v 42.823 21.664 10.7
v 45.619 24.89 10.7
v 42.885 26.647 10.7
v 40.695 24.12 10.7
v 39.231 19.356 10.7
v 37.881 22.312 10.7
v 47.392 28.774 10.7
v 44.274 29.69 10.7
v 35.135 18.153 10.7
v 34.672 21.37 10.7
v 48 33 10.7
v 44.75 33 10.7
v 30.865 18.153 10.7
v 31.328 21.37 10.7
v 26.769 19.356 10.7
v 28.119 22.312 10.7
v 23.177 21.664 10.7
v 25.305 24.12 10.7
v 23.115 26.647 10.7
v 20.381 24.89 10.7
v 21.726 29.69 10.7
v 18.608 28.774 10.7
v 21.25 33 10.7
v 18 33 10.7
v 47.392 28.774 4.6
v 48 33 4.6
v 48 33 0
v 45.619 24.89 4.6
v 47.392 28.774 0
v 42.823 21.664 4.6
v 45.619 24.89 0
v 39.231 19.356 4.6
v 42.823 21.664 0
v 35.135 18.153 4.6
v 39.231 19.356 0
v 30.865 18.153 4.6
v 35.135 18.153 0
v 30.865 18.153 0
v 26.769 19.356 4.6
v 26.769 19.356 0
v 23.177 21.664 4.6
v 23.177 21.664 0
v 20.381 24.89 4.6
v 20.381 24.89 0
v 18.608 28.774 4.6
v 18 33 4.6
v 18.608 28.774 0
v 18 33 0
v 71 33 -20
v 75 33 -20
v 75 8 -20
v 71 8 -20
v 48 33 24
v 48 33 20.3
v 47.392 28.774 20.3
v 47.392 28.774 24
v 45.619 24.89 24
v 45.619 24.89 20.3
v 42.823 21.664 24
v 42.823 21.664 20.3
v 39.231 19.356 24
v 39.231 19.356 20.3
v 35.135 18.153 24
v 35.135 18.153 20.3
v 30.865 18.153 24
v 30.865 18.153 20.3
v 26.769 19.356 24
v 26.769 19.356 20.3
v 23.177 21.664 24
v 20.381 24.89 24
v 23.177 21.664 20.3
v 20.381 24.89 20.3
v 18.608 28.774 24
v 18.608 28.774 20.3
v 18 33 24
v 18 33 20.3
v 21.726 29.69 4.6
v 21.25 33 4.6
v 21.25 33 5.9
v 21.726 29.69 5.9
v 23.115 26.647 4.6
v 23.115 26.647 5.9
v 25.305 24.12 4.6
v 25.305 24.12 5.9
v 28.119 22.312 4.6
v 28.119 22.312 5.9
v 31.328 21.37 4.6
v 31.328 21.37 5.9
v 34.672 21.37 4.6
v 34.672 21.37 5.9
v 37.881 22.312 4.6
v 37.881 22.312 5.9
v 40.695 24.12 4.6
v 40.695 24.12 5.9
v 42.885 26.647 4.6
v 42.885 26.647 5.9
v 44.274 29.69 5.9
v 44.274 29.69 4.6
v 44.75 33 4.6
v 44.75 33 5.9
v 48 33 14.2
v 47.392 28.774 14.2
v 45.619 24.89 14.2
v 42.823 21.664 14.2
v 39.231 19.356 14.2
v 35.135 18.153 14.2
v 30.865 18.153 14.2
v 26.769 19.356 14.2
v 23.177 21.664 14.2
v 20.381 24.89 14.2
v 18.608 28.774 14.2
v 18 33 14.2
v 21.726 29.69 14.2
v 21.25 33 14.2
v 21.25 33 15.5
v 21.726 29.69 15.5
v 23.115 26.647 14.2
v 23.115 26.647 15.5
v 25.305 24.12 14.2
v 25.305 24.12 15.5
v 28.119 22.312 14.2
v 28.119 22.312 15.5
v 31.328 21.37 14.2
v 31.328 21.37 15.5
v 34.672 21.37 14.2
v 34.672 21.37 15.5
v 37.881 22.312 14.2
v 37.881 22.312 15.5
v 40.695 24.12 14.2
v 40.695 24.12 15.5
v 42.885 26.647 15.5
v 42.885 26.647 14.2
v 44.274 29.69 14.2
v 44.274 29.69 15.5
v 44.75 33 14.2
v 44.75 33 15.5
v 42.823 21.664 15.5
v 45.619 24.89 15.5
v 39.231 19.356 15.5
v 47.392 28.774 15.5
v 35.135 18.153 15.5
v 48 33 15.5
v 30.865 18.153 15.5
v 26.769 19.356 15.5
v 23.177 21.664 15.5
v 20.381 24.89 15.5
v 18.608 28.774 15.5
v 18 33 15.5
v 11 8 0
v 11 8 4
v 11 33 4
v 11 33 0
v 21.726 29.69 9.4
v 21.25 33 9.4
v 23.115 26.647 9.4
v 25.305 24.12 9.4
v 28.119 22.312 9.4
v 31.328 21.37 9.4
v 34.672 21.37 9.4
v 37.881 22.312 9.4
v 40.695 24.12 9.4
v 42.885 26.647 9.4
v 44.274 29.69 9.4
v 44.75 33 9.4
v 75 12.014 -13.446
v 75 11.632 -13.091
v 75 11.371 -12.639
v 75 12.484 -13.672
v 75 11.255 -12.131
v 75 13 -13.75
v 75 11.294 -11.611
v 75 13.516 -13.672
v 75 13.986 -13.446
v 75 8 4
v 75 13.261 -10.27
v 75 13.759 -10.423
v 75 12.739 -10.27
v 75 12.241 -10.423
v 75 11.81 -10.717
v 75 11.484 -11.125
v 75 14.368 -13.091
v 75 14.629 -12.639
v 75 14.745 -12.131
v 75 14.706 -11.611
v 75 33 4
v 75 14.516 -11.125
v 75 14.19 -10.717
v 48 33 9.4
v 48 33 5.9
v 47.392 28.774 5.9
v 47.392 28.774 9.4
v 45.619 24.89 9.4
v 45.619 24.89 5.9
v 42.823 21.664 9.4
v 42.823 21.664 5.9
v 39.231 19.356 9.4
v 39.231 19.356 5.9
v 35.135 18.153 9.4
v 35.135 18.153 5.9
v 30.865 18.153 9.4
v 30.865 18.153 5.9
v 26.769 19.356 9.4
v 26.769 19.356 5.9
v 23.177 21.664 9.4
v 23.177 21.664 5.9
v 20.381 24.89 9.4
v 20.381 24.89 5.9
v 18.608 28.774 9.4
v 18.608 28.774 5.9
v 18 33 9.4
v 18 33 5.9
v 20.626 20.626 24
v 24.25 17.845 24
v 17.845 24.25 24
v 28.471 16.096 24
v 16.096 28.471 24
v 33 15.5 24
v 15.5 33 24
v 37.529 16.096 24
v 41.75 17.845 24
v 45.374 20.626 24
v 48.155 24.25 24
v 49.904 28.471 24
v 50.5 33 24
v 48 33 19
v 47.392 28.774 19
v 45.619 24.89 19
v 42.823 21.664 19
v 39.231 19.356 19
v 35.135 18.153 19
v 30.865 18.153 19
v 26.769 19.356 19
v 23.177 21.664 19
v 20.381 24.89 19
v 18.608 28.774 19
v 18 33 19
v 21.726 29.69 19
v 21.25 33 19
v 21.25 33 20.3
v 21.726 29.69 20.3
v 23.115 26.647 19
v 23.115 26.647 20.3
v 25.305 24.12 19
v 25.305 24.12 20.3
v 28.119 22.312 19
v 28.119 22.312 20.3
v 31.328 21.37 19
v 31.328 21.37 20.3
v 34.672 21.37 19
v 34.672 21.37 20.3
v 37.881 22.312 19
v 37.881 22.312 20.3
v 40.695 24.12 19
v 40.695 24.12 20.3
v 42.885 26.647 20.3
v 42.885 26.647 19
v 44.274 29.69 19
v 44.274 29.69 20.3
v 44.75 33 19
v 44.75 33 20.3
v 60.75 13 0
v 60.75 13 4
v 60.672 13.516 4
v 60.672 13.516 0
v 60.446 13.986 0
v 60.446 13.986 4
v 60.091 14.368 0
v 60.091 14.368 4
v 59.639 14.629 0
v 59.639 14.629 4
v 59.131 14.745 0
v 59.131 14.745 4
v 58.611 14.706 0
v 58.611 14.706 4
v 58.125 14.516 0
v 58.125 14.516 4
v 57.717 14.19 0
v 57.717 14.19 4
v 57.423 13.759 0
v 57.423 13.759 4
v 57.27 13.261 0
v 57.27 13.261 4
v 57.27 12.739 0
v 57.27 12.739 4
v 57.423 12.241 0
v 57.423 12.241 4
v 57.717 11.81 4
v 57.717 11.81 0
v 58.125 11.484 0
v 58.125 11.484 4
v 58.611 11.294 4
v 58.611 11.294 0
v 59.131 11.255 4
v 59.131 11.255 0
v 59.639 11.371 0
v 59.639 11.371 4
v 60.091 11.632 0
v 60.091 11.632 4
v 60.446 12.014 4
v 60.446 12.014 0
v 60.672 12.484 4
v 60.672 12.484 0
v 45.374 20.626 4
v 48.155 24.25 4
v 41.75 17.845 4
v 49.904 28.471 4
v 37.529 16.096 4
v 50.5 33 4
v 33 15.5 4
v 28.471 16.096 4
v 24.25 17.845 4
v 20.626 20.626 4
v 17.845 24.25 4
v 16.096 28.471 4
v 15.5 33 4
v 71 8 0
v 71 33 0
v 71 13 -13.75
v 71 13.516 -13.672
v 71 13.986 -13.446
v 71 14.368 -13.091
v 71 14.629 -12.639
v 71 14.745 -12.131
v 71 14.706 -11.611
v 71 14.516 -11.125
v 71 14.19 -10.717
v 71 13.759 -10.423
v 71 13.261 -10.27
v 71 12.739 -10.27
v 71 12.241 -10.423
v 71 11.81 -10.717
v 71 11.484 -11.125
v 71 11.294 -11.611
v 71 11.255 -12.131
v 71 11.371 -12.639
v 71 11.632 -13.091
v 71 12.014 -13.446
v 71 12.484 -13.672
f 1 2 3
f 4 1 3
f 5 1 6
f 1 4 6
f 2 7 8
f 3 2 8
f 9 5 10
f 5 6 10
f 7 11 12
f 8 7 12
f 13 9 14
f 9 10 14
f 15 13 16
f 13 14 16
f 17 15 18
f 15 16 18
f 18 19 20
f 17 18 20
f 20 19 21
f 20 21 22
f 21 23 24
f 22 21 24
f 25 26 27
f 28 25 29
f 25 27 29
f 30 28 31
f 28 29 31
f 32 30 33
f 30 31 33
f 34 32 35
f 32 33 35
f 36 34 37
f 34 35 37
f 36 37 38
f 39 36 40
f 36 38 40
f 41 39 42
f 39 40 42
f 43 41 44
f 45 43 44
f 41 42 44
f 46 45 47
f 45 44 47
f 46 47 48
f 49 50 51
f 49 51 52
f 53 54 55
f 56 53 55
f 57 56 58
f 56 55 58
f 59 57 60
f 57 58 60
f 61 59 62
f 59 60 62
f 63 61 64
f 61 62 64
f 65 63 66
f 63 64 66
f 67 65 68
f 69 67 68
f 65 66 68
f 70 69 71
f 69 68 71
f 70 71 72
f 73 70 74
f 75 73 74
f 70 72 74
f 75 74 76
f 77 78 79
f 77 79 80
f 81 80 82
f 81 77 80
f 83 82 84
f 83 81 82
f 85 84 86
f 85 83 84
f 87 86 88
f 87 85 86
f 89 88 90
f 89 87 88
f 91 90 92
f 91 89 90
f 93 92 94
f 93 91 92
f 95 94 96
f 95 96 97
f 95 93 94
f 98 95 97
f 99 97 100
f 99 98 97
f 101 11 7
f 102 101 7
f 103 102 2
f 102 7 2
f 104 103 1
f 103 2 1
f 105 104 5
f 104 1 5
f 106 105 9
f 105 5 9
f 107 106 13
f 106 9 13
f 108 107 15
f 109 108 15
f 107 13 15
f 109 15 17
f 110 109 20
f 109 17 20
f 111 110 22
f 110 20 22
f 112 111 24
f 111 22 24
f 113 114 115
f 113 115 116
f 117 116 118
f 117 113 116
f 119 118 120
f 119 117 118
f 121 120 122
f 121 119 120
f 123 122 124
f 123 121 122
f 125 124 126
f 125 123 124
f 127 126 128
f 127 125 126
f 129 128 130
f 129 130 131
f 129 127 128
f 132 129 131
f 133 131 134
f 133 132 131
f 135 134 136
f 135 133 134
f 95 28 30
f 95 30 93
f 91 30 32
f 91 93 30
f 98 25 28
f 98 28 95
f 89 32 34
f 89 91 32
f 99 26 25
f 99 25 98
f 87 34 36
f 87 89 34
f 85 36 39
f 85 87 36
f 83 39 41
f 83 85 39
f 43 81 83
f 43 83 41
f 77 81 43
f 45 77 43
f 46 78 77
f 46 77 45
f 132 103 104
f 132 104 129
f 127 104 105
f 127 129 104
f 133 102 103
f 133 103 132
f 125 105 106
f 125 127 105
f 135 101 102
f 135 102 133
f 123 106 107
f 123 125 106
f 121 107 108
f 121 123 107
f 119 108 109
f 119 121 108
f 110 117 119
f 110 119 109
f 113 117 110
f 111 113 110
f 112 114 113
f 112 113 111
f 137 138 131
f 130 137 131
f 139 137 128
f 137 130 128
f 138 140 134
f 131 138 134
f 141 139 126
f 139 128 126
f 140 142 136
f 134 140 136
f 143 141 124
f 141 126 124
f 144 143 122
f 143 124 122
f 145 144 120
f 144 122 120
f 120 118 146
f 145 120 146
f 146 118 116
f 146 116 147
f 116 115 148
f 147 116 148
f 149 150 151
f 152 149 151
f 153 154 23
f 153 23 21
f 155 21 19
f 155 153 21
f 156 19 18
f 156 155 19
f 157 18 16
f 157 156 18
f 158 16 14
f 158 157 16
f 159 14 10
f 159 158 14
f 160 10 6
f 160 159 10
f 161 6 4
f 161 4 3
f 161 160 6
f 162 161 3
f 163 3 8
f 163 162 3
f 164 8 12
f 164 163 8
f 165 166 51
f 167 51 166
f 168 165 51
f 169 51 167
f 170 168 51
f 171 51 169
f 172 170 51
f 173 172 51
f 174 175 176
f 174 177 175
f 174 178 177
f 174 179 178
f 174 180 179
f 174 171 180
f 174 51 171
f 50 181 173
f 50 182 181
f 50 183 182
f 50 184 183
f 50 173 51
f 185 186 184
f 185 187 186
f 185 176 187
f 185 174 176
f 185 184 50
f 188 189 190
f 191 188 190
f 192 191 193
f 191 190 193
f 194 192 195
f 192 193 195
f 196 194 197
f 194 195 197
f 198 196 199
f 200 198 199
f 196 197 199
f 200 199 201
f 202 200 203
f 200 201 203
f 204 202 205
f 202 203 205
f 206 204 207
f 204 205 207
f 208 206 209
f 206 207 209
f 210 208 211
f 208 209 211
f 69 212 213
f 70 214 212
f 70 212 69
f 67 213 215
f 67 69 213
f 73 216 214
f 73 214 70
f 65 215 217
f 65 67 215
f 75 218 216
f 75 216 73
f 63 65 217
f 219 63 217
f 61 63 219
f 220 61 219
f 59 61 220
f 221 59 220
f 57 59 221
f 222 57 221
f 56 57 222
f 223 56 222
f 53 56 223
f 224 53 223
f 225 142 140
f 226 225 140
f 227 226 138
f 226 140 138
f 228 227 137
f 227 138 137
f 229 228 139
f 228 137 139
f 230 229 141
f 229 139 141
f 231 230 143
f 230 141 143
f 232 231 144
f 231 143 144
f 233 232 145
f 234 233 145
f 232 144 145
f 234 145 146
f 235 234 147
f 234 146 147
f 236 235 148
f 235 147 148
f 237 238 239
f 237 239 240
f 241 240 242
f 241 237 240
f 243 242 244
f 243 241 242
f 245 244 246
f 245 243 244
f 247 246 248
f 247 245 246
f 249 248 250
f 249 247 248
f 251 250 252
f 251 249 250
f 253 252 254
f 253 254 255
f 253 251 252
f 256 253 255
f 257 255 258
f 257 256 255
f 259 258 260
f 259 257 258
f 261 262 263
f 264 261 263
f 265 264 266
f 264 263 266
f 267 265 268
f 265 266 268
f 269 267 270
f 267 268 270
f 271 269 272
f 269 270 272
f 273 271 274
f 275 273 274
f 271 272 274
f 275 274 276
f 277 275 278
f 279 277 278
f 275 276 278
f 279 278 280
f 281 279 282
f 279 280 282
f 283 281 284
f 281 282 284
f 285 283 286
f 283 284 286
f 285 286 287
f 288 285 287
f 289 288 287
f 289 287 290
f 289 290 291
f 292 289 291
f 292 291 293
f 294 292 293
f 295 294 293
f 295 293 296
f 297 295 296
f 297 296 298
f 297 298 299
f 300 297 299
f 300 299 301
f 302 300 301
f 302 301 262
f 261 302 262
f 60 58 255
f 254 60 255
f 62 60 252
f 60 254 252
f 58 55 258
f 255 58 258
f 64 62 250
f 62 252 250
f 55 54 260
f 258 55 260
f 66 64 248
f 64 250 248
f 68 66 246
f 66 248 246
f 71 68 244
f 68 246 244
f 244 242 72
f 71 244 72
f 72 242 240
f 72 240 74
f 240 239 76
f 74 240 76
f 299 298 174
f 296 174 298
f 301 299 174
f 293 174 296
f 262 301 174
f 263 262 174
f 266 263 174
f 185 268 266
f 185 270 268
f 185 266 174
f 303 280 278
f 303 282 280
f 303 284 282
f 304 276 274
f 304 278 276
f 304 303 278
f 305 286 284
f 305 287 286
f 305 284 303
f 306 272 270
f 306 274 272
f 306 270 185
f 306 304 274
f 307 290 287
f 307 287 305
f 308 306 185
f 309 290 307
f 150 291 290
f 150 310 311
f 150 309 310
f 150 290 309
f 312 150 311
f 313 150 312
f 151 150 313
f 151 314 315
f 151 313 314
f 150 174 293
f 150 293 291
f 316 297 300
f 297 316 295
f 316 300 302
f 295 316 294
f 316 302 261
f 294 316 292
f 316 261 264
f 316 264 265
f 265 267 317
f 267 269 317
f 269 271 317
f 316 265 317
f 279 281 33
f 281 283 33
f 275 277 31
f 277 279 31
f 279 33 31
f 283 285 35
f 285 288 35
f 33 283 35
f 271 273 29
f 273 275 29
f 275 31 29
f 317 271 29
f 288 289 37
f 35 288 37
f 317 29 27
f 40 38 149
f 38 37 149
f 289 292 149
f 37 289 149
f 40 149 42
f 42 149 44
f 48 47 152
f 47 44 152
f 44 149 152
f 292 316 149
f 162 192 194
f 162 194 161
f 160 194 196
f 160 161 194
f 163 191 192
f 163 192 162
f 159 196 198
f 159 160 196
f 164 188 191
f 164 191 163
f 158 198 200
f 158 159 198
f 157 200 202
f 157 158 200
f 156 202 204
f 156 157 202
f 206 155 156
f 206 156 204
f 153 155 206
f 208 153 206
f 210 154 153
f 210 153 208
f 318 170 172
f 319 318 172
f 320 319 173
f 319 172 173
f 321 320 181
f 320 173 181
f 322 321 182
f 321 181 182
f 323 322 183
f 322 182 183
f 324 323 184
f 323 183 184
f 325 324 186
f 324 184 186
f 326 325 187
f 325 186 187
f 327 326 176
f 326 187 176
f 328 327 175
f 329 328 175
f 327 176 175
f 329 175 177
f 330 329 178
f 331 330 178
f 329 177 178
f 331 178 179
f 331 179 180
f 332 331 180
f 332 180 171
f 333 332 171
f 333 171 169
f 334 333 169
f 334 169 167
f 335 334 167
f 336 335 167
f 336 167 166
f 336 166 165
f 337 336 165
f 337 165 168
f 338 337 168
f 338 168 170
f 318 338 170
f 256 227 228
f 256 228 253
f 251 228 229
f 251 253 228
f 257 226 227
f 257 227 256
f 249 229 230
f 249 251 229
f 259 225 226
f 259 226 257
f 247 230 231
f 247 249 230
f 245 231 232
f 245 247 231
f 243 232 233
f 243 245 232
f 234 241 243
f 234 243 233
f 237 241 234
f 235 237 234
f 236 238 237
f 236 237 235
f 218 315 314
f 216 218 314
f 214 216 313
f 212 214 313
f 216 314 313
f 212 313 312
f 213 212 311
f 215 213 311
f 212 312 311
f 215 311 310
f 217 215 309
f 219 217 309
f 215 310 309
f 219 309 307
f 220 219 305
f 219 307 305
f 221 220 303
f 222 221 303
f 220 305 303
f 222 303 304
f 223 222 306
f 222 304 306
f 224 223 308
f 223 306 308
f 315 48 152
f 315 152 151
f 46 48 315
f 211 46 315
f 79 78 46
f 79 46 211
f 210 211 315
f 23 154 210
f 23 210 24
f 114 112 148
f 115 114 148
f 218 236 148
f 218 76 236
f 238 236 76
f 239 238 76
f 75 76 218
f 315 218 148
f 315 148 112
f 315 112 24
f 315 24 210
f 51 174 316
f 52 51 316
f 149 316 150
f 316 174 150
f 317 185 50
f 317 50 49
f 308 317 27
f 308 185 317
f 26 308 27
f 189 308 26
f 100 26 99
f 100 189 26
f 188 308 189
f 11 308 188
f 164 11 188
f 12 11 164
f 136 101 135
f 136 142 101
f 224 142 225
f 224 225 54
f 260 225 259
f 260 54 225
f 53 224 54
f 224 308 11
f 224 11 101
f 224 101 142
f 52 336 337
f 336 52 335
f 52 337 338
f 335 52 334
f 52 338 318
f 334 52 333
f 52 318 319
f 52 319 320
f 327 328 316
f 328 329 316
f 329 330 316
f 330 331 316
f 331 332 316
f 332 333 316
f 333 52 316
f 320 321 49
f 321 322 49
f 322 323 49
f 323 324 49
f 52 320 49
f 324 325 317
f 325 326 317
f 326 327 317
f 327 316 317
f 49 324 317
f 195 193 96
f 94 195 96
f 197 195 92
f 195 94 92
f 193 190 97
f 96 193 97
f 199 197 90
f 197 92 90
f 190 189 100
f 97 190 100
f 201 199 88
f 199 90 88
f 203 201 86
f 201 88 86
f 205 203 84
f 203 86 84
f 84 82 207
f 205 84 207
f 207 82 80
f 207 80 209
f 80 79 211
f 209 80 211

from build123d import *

# Parameters (mm, degrees)
SKETCH1_W            = 66
SKETCH1_H            = 33
BOSS_EXTRUDE1_DEPTH  = 4
CUT_EXTRUDE1_DEPTH   = 5
BOSS_EXTRUDE2_DEPTH  = 20
BOSS_EXTRUDE3_DEPTH  = 1.3
BOSS_EXTRUDE4_DEPTH  = 1.3
BOSS_EXTRUDE5_DEPTH  = 1.3
BOSS_EXTRUDE6_DEPTH  = 1.3
SKETCH11_W           = 66
SKETCH11_H           = 8
CUT_EXTRUDE4_DEPTH   = 10
SKETCH13_W           = 4
SKETCH13_H           = 25
BOSS_EXTRUDE7_DEPTH  = 5
SKETCH14_W           = 4
SKETCH14_H           = 25
BOSS_EXTRUDE8_DEPTH  = 8
SKETCH16_R           = 1.75
CUT_EXTRUDE5_DEPTH   = 12
SKETCH17_R           = 1.75
CUT_EXTRUDE8_DEPTH   = 12
SKETCH18_W           = 4
SKETCH18_H           = 25
CUT_EXTRUDE9_DEPTH   = 3
SKETCH19_W           = 4
SKETCH19_H           = 25
BOSS_EXTRUDE10_DEPTH = 4
SKETCH20_W           = 4
SKETCH20_H           = 25
BOSS_EXTRUDE11_DEPTH = 20
SKETCH21_R           = 1.75
CUT_EXTRUDE10_DEPTH  = 20
SKETCH22_W           = 16
SKETCH22_H           = 25
CUT_EXTRUDE11_DEPTH  = 25


with BuildPart() as part:
    # Sketch1 → Boss-Extrude1 (new body)
    with BuildSketch(Plane.XY):
        with Locations((33, 16.5)):
            Rectangle(SKETCH1_W, SKETCH1_H)
    extrude(amount=BOSS_EXTRUDE1_DEPTH)

    # Sketch2 → Cut-Extrude1 (cut, through all)
    with BuildSketch(Plane.XY.offset(4)):
        with BuildLine():
            Line((18, 33), (48, 33))
            ThreePointArc((48, 33), (33, 18), (18, 33))
        make_face()
    extrude(amount=-CUT_EXTRUDE1_DEPTH, mode=Mode.SUBTRACT)

    # Sketch3 → Boss-Extrude2 (add)
    with BuildSketch(Plane.XY.offset(4)):
        with BuildLine():
            Line((18, 33), (15.5, 33))
            ThreePointArc((15.5, 33), (33, 15.5), (50.5, 33))
            Line((50.5, 33), (48, 33))
            ThreePointArc((48, 33), (33, 18), (18, 33))
        make_face()
    extrude(amount=BOSS_EXTRUDE2_DEPTH)

    # Sketch5 → Boss-Extrude3 (add)
    with BuildSketch(Plane.XY.offset(4.6)):
        with BuildLine():
            Line((18, 33), (21.25, 33))
            ThreePointArc((21.25, 33), (33, 21.25), (44.75, 33))
            Line((44.75, 33), (48, 33))
            ThreePointArc((48, 33), (33, 18), (18, 33))
        make_face()
    extrude(amount=BOSS_EXTRUDE3_DEPTH)

    # Sketch6 → Boss-Extrude4 (add)
    with BuildSketch(Plane.XY.offset(9.4)):
        with BuildLine():
            Line((18, 33), (21.25, 33))
            ThreePointArc((21.25, 33), (33, 21.25), (44.75, 33))
            Line((44.75, 33), (48, 33))
            ThreePointArc((48, 33), (33, 18), (18, 33))
        make_face()
    extrude(amount=BOSS_EXTRUDE4_DEPTH)

    # Sketch7 → Boss-Extrude5 (add)
    with BuildSketch(Plane.XY.offset(14.2)):
        with BuildLine():
            Line((18, 33), (21.25, 33))
            ThreePointArc((21.25, 33), (33, 21.25), (44.75, 33))
            Line((44.75, 33), (48, 33))
            ThreePointArc((48, 33), (33, 18), (18, 33))
        make_face()
    extrude(amount=BOSS_EXTRUDE5_DEPTH)

    # Sketch8 → Boss-Extrude6 (add)
    with BuildSketch(Plane.XY.offset(19)):
        with BuildLine():
            Line((18, 33), (21.25, 33))
            ThreePointArc((21.25, 33), (33, 21.25), (44.75, 33))
            Line((44.75, 33), (48, 33))
            ThreePointArc((48, 33), (33, 18), (18, 33))
        make_face()
    extrude(amount=BOSS_EXTRUDE6_DEPTH)

    # Sketch11 → Cut-Extrude4 (cut)
    with BuildSketch(Plane.XY.offset(4)):
        with Locations((33, 4)):
            Rectangle(SKETCH11_W, SKETCH11_H)
    extrude(amount=-CUT_EXTRUDE4_DEPTH, mode=Mode.SUBTRACT)

    # Sketch13 → Boss-Extrude7 (add)
    with BuildSketch(Plane.ZY):
        with Locations((2, 20.5)):
            Rectangle(SKETCH13_W, SKETCH13_H)
    extrude(amount=BOSS_EXTRUDE7_DEPTH)

    # Sketch14 → Boss-Extrude8 (add)
    with BuildSketch(Plane(origin=(66, 0, 0), x_dir=(0, 0, -1), z_dir=(1, 0, 0))):
        with Locations((-2, 20.5)):
            Rectangle(SKETCH14_W, SKETCH14_H)
    extrude(amount=BOSS_EXTRUDE8_DEPTH)

    # Sketch16 → Cut-Extrude5 (cut)
    with BuildSketch(Plane(origin=(74, 0, 0), x_dir=(0, 0, -1), z_dir=(1, 0, 0))):
        with Locations((14, 13)):
            Circle(SKETCH16_R)
    extrude(amount=-CUT_EXTRUDE5_DEPTH, mode=Mode.SUBTRACT)

    # Sketch17 → Cut-Extrude8 (cut)
    with BuildSketch(Plane.XY.offset(4)):
        with Locations((59, 13)):
            Circle(SKETCH17_R)
    extrude(amount=-CUT_EXTRUDE8_DEPTH, mode=Mode.SUBTRACT)

    # Sketch18 → Cut-Extrude9 (cut)
    with BuildSketch(Plane(origin=(74, 0, 0), x_dir=(0, 0, -1), z_dir=(1, 0, 0))):
        with Locations((-2, 20.5)):
            Rectangle(SKETCH18_W, SKETCH18_H)
    extrude(amount=-CUT_EXTRUDE9_DEPTH, mode=Mode.SUBTRACT)

    # Sketch19 → Boss-Extrude10 (add)
    with BuildSketch(Plane(origin=(71, 0, 0), x_dir=(0, 0, -1), z_dir=(1, 0, 0))):
        with Locations((-2, 20.5)):
            Rectangle(SKETCH19_W, SKETCH19_H)
    extrude(amount=BOSS_EXTRUDE10_DEPTH)

    # Sketch20 → Boss-Extrude11 (add)
    with BuildSketch(Plane(origin=(0, 0, 0), x_dir=(-1, 0, 0), z_dir=(0, 0, -1))):
        with Locations((-73, 20.5)):
            Rectangle(SKETCH20_W, SKETCH20_H)
    extrude(amount=BOSS_EXTRUDE11_DEPTH)

    # Sketch21 → Cut-Extrude10 (cut)
    with BuildSketch(Plane(origin=(75, 0, 0), x_dir=(0, 0, -1), z_dir=(1, 0, 0))):
        with Locations((12, 13)):
            Circle(SKETCH21_R)
    extrude(amount=-CUT_EXTRUDE10_DEPTH, mode=Mode.SUBTRACT)

    # Sketch22 → Cut-Extrude11 (cut, through all)
    with BuildSketch(Plane.XY.offset(4)):
        with Locations((3, 20.5)):
            Rectangle(SKETCH22_W, SKETCH22_H)
    extrude(amount=-CUT_EXTRUDE11_DEPTH, mode=Mode.SUBTRACT)


solid = part.part
